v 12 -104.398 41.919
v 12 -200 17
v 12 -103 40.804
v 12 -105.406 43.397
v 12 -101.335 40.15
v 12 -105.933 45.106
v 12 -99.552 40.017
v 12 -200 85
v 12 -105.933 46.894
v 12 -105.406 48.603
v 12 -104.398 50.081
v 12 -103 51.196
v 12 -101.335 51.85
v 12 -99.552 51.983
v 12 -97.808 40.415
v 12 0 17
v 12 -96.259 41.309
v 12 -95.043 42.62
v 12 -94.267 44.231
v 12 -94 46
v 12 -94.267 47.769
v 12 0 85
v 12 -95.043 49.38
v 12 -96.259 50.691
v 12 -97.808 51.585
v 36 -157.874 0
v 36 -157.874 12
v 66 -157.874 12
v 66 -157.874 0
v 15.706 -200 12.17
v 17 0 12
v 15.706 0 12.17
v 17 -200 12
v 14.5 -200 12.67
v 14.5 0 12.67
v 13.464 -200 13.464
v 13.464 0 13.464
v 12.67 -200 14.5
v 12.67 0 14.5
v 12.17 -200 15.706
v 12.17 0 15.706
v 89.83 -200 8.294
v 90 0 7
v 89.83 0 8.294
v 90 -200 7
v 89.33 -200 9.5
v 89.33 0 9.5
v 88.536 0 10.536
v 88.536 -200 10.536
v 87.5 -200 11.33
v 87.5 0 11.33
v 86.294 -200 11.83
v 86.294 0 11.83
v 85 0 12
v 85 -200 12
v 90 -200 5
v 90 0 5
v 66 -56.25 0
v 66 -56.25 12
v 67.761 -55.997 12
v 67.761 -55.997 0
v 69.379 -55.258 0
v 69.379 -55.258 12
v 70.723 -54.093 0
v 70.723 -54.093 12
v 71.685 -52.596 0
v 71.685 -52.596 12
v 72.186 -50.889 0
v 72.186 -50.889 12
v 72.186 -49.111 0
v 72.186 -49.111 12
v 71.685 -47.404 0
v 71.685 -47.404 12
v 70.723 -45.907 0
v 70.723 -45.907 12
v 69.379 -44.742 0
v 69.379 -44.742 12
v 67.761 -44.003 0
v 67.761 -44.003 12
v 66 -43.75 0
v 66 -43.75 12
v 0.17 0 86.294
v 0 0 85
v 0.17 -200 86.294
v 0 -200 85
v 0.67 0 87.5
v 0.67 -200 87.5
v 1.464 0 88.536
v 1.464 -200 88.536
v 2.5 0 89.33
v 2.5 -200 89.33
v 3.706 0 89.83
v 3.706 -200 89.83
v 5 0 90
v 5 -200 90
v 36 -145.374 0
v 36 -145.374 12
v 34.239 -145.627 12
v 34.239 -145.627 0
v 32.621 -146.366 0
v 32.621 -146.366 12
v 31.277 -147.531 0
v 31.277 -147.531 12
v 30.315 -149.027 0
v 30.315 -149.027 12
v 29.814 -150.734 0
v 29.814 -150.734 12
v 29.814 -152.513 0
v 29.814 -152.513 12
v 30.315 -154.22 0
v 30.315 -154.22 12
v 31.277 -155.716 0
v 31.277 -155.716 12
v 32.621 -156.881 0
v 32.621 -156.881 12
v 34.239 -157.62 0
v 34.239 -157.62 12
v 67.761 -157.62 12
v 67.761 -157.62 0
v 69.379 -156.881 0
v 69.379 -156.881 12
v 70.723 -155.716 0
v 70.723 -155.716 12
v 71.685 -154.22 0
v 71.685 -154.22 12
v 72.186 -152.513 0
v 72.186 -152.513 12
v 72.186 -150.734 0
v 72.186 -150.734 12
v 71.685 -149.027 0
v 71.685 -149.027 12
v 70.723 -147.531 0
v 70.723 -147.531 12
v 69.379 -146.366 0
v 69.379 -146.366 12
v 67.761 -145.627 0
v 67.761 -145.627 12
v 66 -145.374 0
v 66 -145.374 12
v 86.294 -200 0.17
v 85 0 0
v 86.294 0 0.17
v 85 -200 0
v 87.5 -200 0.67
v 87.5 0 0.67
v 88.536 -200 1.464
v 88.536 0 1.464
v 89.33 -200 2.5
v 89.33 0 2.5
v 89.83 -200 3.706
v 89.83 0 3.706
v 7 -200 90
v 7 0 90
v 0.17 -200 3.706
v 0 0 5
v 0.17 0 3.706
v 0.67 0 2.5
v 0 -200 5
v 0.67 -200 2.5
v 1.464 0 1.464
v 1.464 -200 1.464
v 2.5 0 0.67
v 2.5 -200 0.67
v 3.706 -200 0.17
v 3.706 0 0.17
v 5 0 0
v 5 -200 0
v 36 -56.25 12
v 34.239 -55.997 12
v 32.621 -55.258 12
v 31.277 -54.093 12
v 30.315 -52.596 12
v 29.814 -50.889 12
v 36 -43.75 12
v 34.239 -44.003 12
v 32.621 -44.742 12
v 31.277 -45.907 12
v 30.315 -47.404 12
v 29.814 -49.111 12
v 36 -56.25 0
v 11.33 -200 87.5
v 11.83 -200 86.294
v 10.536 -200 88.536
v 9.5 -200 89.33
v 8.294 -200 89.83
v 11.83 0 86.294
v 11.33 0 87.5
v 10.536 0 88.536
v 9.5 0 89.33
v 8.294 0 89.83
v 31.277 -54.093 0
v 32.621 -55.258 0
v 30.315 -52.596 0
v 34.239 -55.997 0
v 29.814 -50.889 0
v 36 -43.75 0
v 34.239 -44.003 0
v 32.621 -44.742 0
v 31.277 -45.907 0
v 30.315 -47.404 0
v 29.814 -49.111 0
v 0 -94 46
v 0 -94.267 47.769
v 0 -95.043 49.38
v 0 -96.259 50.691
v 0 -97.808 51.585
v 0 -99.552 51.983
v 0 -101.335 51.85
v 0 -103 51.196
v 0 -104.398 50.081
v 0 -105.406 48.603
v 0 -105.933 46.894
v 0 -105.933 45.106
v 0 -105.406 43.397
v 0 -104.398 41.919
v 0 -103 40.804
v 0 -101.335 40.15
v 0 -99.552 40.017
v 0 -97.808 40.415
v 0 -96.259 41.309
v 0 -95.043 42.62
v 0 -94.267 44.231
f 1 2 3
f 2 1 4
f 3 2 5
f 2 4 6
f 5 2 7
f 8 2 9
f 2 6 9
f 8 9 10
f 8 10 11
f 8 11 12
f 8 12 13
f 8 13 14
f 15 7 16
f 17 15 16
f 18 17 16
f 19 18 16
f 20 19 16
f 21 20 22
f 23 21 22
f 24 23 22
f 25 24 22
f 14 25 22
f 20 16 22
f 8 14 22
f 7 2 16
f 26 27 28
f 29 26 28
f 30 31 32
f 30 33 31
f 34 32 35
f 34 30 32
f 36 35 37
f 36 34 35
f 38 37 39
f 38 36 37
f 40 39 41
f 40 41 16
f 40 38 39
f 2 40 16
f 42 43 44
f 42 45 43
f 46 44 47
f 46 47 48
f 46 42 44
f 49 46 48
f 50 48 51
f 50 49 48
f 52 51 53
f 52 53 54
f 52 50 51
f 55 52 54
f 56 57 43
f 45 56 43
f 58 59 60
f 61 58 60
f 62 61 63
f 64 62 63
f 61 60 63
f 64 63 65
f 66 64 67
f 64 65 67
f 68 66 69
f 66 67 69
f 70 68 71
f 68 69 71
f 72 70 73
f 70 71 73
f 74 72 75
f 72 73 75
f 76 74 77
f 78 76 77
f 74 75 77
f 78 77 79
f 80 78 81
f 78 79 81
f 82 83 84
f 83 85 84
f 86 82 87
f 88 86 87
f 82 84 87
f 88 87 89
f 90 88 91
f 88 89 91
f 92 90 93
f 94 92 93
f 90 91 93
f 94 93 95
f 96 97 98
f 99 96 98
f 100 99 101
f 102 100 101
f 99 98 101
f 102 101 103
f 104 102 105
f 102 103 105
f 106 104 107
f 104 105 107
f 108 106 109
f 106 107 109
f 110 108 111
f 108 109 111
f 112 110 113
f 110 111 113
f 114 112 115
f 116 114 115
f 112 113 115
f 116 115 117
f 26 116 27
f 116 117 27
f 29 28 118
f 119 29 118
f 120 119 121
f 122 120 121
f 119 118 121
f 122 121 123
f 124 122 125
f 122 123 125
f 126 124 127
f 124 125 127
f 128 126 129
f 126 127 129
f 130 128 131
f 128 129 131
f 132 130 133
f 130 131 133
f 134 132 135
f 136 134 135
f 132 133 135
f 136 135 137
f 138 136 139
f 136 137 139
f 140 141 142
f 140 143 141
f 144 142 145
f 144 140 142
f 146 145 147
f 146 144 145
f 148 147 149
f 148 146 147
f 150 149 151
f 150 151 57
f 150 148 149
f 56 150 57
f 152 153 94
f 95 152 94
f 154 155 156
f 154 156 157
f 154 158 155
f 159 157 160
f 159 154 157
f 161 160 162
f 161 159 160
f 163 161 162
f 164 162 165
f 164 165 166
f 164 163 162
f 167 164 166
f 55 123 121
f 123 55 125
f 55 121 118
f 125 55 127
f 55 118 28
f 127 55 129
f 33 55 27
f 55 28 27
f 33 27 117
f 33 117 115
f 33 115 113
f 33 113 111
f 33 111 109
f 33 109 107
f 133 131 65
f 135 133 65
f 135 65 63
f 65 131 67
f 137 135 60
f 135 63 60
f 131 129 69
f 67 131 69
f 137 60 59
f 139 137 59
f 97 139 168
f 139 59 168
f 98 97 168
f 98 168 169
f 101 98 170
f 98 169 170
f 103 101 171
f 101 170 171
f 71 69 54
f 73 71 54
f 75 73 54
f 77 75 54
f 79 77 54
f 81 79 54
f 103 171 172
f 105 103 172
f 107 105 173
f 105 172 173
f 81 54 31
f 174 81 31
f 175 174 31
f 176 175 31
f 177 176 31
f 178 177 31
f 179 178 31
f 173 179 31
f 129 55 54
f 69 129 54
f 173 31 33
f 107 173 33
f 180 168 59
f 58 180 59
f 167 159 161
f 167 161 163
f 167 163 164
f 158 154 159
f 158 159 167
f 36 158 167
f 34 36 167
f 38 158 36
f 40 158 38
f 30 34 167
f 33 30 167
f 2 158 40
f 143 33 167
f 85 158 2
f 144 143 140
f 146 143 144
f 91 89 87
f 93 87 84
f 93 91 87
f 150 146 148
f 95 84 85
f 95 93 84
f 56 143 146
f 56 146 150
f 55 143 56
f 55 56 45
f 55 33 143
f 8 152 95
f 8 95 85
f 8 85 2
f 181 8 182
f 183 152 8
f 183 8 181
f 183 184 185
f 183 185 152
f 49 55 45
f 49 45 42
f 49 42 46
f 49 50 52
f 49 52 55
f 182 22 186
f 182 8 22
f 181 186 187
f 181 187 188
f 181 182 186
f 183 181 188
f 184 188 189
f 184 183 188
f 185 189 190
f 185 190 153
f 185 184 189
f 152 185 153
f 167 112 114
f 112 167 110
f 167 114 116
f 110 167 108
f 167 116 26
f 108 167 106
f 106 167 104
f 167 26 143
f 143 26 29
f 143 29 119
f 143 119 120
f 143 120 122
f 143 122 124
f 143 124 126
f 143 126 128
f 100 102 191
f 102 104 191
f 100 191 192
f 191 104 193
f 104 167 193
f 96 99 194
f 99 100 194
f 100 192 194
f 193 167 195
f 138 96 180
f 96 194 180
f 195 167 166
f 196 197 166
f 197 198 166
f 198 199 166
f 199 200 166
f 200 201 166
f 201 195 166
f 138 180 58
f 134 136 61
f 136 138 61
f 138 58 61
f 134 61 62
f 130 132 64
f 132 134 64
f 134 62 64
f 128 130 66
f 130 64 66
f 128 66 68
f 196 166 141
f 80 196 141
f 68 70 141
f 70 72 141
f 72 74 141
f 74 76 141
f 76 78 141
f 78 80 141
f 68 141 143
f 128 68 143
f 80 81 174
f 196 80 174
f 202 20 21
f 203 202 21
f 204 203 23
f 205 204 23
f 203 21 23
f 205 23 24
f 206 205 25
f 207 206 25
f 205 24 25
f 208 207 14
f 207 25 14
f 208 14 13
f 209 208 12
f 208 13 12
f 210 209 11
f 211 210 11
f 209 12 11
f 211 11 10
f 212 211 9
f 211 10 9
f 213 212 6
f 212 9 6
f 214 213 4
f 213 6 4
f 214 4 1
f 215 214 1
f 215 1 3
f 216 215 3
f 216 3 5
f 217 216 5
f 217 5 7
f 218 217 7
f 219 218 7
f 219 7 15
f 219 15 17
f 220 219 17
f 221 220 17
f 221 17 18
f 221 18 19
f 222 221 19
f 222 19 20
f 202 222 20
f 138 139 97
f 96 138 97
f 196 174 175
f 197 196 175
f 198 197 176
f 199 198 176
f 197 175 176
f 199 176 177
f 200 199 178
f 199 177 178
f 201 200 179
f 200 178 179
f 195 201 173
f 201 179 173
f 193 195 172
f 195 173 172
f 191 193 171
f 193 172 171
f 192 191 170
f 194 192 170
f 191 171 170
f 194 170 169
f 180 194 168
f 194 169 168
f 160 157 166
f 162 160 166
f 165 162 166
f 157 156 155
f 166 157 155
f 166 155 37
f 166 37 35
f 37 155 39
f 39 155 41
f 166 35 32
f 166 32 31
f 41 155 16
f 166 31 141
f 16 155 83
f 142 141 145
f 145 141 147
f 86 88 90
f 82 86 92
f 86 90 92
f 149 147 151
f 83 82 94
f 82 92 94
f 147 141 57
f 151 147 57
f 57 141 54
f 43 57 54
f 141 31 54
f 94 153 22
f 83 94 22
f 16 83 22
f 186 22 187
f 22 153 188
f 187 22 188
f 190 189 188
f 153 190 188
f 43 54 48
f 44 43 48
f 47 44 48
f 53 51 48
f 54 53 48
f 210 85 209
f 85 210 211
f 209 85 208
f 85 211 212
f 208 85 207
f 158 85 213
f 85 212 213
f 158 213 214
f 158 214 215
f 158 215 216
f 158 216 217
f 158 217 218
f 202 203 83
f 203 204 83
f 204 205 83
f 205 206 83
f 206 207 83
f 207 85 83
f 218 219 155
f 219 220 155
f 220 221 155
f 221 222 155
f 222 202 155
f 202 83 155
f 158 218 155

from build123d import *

# Parameters (mm, degrees)
F1_DEPTH = 200
F2_R     = 5
F3_R     = 6
F4_DEPTH = 25
F6_DEPTH = 25


with BuildPart() as f1:
    # F0 (on Front) → F1 (new body)
    with BuildSketch(Plane.XZ):
        Polygon((0, 90), (0, 0), (90, 0), (90, 12), (12, 12), (12, 90), align=None)
    extrude(amount=F1_DEPTH)

    # F2
    f2_edges = [f1.edges().sort_by_distance(p)[0] for p in [
        (12, -100, 90),
        (12, -100, 12),
        (90, -100, 12),
        (90, -100, 0),
        (0, -100, 90),
        (0, -100, 0),
    ]]
    fillet(f2_edges, radius=F2_R)

    # F3 (on face) → F4 (cut)
    with BuildSketch(Plane.YZ.offset(12)):
        with Locations((-100, 46)):
            Circle(F3_R)
    extrude(amount=-F4_DEPTH, mode=Mode.SUBTRACT)

    # F5 (on face) → F6 (cut)
    with BuildSketch(Plane.XY.offset(12)):
        with BuildLine():
            Line((66, -145.373556), (36, -145.373556))
            ThreePointArc((36, -145.373556), (29.75, -151.623556), (36, -157.873556))
            Line((36, -157.873556), (66, -157.873556))
            ThreePointArc((66, -157.873556), (72.25, -151.623556), (66, -145.373556))
        make_face()
        with BuildLine():
            Line((66, -43.75), (36, -43.75))
            ThreePointArc((36, -43.75), (29.75, -50), (36, -56.25))
            Line((36, -56.25), (66, -56.25))
            ThreePointArc((66, -56.25), (72.25, -50), (66, -43.75))
        make_face()
    extrude(amount=-F6_DEPTH, mode=Mode.SUBTRACT)


solid = f1.part
